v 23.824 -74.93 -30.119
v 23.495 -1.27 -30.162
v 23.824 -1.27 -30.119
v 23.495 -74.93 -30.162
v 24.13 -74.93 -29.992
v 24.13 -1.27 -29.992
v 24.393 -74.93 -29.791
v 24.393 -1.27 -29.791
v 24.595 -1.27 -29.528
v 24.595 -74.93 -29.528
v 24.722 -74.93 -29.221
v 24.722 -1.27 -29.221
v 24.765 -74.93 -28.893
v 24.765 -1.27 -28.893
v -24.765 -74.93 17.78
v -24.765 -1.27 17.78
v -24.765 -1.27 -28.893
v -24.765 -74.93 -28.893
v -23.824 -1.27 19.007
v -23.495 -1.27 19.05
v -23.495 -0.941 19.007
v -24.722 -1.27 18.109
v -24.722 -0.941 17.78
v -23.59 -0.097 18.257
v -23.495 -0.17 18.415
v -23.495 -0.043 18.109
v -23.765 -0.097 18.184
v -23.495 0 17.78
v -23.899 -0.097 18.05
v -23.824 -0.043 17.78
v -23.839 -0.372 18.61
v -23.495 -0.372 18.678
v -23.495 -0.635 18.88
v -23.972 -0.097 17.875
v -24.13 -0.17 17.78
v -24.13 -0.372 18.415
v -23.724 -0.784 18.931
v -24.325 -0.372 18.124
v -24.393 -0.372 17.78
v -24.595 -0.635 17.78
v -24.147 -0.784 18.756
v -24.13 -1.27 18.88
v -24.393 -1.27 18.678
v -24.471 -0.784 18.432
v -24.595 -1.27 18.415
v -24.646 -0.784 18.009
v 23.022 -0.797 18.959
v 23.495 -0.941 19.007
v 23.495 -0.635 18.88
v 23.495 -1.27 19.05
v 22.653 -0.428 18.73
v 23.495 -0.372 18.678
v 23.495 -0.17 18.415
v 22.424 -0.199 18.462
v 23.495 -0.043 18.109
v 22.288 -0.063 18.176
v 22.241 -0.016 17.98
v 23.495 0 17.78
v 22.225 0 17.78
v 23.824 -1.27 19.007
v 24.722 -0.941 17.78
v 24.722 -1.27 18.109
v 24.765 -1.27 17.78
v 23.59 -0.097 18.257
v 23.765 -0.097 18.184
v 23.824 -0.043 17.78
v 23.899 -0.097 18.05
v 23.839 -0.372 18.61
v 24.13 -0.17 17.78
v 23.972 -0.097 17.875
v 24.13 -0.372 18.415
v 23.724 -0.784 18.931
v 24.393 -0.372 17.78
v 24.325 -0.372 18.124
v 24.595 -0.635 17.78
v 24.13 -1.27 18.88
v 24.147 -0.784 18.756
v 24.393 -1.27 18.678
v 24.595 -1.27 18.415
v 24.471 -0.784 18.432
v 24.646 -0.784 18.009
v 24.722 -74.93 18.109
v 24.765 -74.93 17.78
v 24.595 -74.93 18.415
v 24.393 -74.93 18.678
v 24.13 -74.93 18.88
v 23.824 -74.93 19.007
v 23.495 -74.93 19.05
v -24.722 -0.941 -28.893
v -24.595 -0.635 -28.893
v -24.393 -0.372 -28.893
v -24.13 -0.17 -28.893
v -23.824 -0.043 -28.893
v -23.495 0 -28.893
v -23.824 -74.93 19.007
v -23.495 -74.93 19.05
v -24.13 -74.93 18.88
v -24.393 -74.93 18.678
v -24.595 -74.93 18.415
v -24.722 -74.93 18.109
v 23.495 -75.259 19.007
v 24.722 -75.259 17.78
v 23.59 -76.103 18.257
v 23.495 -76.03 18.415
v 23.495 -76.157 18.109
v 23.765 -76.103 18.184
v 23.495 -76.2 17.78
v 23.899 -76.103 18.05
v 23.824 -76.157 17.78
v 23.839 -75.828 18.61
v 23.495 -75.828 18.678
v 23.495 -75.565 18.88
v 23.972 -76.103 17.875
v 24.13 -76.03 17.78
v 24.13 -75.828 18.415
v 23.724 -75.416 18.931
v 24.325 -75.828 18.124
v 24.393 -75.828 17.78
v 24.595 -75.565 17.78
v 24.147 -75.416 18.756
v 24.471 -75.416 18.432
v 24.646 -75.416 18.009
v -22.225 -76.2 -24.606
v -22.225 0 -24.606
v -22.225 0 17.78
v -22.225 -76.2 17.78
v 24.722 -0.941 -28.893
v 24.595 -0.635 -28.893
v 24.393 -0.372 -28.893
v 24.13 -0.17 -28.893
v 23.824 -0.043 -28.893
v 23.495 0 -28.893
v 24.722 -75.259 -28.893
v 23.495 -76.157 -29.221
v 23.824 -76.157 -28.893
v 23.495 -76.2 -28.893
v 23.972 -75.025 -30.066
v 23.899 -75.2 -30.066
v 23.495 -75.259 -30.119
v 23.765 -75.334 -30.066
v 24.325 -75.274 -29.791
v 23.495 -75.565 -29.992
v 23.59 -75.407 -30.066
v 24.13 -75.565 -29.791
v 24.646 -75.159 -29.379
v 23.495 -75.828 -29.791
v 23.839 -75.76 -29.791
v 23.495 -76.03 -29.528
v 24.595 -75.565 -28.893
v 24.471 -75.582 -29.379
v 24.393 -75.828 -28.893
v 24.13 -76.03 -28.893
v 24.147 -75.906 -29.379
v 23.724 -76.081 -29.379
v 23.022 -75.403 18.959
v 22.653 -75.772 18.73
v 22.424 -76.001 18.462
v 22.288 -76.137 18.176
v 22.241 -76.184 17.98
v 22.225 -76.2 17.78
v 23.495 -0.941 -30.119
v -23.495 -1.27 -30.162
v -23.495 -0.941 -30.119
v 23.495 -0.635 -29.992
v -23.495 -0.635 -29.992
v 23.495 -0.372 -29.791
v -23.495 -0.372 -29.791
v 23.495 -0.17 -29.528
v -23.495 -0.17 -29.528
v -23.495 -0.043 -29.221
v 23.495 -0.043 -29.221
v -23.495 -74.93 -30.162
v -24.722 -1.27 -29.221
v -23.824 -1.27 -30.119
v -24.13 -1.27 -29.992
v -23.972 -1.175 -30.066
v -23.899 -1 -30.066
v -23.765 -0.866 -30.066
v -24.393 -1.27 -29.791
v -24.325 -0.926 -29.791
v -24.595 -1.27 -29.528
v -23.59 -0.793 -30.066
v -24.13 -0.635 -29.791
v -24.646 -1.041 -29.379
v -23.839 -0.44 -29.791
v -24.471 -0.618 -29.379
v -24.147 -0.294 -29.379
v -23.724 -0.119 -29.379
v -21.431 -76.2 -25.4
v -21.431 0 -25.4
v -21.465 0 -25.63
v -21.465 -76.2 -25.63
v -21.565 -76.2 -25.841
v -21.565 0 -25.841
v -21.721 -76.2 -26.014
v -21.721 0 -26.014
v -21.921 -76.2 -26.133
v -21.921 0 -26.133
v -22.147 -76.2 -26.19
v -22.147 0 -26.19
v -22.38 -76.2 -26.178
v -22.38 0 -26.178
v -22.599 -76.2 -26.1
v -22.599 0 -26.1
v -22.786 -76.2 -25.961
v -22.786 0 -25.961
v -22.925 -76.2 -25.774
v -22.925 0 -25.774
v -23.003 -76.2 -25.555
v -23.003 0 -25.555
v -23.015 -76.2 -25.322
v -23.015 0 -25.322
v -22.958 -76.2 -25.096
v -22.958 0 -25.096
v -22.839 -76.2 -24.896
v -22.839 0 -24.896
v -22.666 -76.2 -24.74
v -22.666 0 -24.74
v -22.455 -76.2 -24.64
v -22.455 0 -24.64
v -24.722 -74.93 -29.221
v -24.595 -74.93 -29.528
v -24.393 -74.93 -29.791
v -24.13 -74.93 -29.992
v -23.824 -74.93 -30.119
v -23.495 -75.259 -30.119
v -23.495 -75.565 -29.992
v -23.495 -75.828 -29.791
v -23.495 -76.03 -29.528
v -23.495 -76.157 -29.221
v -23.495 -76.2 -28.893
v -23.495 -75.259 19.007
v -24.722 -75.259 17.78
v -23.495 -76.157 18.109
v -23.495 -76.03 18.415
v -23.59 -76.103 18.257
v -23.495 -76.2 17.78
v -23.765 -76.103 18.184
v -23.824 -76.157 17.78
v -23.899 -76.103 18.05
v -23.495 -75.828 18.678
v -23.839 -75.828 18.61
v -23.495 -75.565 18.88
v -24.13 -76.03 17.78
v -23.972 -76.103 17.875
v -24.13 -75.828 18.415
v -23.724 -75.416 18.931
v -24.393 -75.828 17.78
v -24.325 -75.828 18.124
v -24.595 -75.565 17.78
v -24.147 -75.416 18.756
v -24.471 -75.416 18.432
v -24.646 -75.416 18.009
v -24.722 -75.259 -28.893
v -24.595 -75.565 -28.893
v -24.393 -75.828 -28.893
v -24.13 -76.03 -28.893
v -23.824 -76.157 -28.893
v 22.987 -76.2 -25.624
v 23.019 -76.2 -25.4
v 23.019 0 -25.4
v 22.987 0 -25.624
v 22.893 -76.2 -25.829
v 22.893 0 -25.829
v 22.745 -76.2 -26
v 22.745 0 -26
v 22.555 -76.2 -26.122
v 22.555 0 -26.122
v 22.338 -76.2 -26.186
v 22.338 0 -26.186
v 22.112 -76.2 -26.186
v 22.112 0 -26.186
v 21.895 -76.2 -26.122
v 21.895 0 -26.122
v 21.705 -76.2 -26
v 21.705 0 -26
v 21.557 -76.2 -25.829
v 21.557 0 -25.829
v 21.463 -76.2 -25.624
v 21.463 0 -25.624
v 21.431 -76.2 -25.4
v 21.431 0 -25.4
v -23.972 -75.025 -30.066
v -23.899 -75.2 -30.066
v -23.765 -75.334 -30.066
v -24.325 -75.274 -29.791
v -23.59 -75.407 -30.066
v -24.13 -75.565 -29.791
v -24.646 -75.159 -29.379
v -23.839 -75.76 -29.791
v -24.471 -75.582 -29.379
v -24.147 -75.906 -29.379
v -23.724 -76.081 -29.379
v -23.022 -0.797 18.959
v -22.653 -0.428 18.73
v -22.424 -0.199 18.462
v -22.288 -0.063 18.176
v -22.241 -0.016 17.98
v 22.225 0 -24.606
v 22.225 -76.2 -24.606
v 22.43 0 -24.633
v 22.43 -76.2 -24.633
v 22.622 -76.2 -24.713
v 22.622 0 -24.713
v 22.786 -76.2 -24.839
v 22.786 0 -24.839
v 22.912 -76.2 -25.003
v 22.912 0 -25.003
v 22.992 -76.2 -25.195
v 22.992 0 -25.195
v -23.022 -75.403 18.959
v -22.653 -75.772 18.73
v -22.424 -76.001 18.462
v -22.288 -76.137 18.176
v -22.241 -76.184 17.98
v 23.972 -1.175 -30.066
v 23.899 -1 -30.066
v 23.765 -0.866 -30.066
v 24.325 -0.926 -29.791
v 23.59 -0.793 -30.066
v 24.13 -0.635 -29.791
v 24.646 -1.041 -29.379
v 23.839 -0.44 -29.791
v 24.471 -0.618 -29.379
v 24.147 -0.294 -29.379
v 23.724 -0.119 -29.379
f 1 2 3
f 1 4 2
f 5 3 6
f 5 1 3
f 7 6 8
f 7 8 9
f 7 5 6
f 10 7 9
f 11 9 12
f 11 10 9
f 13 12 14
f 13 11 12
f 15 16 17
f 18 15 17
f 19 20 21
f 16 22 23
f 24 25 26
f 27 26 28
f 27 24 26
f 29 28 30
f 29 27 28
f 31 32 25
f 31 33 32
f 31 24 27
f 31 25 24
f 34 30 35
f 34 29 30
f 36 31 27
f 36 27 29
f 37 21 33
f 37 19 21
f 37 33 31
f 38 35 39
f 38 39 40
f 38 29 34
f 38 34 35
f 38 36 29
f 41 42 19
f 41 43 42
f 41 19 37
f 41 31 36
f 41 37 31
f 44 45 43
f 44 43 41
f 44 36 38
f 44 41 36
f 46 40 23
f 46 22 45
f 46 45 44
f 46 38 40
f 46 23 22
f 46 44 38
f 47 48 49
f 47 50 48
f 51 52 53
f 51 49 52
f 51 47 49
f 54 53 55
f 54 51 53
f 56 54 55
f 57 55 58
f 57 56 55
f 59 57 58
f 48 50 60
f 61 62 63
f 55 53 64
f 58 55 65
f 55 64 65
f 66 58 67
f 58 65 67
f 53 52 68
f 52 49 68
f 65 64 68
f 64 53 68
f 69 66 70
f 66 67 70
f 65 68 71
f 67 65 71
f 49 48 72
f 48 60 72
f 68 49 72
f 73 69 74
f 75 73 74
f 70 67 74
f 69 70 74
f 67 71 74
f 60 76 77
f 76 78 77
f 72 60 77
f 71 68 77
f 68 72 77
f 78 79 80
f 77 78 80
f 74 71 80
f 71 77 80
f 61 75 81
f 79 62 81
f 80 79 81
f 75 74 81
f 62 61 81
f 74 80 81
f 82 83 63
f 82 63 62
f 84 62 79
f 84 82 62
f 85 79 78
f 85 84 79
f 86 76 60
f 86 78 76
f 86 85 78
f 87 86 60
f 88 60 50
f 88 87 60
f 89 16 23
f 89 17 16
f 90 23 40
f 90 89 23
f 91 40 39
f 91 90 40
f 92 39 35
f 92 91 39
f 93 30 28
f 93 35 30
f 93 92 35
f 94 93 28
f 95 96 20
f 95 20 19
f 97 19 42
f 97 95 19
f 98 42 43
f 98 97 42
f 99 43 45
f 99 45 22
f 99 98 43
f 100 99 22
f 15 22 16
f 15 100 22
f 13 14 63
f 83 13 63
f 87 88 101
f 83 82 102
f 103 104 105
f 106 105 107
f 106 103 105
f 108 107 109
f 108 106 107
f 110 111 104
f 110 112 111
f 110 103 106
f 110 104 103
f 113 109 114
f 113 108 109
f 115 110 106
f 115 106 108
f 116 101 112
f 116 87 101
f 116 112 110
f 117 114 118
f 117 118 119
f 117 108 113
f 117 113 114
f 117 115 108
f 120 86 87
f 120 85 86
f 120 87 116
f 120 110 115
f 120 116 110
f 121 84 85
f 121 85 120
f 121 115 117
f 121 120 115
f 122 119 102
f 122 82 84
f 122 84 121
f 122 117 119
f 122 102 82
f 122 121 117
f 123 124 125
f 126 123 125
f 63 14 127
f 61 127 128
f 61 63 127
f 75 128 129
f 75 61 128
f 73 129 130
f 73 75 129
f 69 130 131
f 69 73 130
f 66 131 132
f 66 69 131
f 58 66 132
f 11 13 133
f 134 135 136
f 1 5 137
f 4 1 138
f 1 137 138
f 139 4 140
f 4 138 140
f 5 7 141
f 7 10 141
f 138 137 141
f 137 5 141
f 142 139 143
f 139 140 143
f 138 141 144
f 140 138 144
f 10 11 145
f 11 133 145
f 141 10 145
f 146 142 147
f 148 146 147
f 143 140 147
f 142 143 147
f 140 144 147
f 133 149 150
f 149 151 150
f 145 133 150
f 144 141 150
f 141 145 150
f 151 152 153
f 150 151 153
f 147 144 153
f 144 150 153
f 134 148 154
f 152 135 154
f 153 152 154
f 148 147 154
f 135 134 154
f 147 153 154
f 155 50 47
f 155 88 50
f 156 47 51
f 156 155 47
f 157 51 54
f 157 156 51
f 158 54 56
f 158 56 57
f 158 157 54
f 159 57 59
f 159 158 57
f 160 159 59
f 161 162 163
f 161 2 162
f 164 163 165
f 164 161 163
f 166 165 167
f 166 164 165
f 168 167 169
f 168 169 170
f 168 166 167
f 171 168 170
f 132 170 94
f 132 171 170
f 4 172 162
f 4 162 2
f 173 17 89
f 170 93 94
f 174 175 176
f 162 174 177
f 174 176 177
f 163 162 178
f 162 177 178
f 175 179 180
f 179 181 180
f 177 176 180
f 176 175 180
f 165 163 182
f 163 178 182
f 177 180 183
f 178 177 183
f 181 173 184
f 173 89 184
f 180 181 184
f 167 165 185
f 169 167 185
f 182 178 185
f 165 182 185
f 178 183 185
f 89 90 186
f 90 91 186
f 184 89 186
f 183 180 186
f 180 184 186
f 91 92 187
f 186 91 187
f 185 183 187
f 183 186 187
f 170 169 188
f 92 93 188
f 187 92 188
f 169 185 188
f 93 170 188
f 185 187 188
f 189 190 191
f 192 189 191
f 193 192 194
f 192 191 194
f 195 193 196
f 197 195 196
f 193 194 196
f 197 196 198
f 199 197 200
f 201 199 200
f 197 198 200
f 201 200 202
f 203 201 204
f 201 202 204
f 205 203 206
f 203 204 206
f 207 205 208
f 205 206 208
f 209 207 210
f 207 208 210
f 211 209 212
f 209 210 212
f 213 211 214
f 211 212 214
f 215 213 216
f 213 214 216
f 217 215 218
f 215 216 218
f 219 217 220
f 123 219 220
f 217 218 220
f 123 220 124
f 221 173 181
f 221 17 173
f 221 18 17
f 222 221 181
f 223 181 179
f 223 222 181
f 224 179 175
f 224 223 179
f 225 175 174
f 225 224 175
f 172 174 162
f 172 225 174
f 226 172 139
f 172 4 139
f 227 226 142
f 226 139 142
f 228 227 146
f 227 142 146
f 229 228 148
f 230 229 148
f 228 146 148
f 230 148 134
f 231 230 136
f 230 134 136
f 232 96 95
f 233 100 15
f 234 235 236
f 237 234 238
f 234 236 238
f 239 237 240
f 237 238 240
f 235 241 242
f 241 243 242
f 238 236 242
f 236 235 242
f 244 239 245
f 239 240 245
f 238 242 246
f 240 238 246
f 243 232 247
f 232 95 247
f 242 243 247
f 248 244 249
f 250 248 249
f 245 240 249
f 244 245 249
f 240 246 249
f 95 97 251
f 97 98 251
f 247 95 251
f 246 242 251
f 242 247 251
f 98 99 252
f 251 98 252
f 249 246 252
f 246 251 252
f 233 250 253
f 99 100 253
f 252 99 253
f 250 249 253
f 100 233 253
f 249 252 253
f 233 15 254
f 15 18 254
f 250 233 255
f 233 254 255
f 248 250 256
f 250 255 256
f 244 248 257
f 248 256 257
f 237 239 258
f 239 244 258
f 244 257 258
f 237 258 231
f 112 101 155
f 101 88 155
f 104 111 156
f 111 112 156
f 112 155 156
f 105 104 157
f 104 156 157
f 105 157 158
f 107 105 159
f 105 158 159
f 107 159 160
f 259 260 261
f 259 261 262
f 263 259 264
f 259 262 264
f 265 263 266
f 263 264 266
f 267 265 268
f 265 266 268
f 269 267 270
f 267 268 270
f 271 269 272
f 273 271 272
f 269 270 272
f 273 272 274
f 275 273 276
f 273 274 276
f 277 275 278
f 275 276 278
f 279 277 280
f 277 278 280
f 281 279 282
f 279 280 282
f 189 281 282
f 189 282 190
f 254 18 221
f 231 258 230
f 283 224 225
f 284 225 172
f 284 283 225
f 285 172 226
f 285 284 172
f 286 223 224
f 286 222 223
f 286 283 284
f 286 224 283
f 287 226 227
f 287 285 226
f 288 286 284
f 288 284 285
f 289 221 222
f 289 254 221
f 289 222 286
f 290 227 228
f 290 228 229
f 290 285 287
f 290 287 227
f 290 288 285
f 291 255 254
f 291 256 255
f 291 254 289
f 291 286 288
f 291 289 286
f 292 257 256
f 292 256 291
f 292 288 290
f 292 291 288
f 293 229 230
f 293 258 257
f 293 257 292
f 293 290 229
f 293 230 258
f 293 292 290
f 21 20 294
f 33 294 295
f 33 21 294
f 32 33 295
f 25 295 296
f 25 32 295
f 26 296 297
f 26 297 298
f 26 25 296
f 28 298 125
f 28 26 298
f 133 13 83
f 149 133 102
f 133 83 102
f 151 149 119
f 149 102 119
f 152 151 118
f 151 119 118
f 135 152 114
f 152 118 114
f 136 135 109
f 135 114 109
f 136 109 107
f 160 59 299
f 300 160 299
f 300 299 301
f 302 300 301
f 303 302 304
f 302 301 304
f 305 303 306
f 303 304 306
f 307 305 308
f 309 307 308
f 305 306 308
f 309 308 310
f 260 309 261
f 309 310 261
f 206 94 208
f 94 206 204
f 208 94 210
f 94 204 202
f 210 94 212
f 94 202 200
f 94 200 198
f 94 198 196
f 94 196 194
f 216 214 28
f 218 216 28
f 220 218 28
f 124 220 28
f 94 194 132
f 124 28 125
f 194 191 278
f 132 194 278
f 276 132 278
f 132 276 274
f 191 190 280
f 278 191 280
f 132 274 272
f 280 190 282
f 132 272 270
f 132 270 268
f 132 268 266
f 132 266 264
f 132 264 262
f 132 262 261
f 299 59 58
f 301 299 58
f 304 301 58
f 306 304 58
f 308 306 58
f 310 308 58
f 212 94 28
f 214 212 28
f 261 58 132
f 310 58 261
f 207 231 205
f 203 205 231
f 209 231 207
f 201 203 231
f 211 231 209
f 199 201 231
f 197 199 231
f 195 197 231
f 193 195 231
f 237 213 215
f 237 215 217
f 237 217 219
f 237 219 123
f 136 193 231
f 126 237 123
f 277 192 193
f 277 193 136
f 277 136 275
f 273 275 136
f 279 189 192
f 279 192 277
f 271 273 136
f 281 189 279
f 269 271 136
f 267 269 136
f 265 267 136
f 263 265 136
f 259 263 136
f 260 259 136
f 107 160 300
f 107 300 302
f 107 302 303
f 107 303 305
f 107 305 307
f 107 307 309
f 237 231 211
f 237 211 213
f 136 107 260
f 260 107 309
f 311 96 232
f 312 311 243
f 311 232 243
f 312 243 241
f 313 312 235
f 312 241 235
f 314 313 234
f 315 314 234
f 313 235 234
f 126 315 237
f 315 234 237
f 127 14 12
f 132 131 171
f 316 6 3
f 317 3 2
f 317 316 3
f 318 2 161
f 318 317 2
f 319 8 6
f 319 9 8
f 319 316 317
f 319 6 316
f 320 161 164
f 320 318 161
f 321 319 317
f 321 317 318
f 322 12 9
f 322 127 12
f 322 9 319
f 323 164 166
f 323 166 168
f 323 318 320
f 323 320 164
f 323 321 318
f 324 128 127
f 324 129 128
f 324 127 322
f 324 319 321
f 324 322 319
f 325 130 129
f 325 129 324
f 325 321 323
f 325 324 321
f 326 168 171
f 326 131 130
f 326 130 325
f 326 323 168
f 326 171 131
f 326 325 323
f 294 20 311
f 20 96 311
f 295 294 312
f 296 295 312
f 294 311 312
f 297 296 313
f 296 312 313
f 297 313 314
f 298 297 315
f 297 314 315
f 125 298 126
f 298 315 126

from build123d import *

# Parameters (mm, degrees)
F1_DEPTH = 76.2
F2_R     = 1.26999


# Not quite as in the source:
# - a fillet or chamfer is up to 0.001 mm smaller than in the source, because OpenCascade refuses the exact size


with BuildPart() as f1:
    # F0 (on Front) → F1 (new body)
    with BuildSketch(Plane.XZ):
        with BuildLine():
            Line((-22.225, 19.05), (-24.765, 19.05))
            Line((-24.765, 19.05), (-24.765, -30.1625))
            Line((-24.765, -30.1625), (0, -30.1625))
            Line((0, -30.1625), (0, -25.4))
            Line((0, -25.4), (-21.43125, -25.4))
            ThreePointArc((-21.43125, -25.4), (-22.7862660076, -25.9612660076), (-22.225, -24.60625))
            Line((-22.225, -24.60625), (-22.225, 19.05))
        make_face()
        with BuildLine():
            Line((0, -25.4), (0, -30.1625))
            Line((0, -30.1625), (24.765, -30.1625))
            Line((24.765, -30.1625), (24.765, 19.05))
            Line((24.765, 19.05), (22.225, 19.05))
            Line((22.225, 19.05), (22.225, -24.60625))
            ThreePointArc((22.225, -24.60625), (22.7862660076, -24.8387339924), (23.01875, -25.4))
            ThreePointArc((23.01875, -25.4), (22.225, -26.19375), (21.43125, -25.4))
            Line((21.43125, -25.4), (0, -25.4))
        make_face()
    extrude(amount=F1_DEPTH)

    # F2 (radius 1.27 in the source; OpenCascade refuses exactly that, so slightly less here)
    f2_edges = [f1.edges().sort_by_distance(p)[0] for p in [
        (24.765, -38.1, 19.05),
        (22.225, -38.1, 19.05),
        (23.495, 0, 19.05),
        (23.495, -76.2, 19.05),
        (-22.225, -38.1, 19.05),
        (-24.765, -38.1, 19.05),
        (-23.495, 0, 19.05),
        (-23.495, -76.2, 19.05),
        (-24.765, -76.2, -5.55625),
        (24.765, -76.2, -5.55625),
        (24.765, 0, -5.55625),
        (-24.765, 0, -5.55625),
        (-24.765, -38.1, -30.1625),
        (24.765, -38.1, -30.1625),
        (0, 0, -30.1625),
        (0, -76.2, -30.1625),
    ]]
    fillet(f2_edges, radius=F2_R)


solid = f1.part
